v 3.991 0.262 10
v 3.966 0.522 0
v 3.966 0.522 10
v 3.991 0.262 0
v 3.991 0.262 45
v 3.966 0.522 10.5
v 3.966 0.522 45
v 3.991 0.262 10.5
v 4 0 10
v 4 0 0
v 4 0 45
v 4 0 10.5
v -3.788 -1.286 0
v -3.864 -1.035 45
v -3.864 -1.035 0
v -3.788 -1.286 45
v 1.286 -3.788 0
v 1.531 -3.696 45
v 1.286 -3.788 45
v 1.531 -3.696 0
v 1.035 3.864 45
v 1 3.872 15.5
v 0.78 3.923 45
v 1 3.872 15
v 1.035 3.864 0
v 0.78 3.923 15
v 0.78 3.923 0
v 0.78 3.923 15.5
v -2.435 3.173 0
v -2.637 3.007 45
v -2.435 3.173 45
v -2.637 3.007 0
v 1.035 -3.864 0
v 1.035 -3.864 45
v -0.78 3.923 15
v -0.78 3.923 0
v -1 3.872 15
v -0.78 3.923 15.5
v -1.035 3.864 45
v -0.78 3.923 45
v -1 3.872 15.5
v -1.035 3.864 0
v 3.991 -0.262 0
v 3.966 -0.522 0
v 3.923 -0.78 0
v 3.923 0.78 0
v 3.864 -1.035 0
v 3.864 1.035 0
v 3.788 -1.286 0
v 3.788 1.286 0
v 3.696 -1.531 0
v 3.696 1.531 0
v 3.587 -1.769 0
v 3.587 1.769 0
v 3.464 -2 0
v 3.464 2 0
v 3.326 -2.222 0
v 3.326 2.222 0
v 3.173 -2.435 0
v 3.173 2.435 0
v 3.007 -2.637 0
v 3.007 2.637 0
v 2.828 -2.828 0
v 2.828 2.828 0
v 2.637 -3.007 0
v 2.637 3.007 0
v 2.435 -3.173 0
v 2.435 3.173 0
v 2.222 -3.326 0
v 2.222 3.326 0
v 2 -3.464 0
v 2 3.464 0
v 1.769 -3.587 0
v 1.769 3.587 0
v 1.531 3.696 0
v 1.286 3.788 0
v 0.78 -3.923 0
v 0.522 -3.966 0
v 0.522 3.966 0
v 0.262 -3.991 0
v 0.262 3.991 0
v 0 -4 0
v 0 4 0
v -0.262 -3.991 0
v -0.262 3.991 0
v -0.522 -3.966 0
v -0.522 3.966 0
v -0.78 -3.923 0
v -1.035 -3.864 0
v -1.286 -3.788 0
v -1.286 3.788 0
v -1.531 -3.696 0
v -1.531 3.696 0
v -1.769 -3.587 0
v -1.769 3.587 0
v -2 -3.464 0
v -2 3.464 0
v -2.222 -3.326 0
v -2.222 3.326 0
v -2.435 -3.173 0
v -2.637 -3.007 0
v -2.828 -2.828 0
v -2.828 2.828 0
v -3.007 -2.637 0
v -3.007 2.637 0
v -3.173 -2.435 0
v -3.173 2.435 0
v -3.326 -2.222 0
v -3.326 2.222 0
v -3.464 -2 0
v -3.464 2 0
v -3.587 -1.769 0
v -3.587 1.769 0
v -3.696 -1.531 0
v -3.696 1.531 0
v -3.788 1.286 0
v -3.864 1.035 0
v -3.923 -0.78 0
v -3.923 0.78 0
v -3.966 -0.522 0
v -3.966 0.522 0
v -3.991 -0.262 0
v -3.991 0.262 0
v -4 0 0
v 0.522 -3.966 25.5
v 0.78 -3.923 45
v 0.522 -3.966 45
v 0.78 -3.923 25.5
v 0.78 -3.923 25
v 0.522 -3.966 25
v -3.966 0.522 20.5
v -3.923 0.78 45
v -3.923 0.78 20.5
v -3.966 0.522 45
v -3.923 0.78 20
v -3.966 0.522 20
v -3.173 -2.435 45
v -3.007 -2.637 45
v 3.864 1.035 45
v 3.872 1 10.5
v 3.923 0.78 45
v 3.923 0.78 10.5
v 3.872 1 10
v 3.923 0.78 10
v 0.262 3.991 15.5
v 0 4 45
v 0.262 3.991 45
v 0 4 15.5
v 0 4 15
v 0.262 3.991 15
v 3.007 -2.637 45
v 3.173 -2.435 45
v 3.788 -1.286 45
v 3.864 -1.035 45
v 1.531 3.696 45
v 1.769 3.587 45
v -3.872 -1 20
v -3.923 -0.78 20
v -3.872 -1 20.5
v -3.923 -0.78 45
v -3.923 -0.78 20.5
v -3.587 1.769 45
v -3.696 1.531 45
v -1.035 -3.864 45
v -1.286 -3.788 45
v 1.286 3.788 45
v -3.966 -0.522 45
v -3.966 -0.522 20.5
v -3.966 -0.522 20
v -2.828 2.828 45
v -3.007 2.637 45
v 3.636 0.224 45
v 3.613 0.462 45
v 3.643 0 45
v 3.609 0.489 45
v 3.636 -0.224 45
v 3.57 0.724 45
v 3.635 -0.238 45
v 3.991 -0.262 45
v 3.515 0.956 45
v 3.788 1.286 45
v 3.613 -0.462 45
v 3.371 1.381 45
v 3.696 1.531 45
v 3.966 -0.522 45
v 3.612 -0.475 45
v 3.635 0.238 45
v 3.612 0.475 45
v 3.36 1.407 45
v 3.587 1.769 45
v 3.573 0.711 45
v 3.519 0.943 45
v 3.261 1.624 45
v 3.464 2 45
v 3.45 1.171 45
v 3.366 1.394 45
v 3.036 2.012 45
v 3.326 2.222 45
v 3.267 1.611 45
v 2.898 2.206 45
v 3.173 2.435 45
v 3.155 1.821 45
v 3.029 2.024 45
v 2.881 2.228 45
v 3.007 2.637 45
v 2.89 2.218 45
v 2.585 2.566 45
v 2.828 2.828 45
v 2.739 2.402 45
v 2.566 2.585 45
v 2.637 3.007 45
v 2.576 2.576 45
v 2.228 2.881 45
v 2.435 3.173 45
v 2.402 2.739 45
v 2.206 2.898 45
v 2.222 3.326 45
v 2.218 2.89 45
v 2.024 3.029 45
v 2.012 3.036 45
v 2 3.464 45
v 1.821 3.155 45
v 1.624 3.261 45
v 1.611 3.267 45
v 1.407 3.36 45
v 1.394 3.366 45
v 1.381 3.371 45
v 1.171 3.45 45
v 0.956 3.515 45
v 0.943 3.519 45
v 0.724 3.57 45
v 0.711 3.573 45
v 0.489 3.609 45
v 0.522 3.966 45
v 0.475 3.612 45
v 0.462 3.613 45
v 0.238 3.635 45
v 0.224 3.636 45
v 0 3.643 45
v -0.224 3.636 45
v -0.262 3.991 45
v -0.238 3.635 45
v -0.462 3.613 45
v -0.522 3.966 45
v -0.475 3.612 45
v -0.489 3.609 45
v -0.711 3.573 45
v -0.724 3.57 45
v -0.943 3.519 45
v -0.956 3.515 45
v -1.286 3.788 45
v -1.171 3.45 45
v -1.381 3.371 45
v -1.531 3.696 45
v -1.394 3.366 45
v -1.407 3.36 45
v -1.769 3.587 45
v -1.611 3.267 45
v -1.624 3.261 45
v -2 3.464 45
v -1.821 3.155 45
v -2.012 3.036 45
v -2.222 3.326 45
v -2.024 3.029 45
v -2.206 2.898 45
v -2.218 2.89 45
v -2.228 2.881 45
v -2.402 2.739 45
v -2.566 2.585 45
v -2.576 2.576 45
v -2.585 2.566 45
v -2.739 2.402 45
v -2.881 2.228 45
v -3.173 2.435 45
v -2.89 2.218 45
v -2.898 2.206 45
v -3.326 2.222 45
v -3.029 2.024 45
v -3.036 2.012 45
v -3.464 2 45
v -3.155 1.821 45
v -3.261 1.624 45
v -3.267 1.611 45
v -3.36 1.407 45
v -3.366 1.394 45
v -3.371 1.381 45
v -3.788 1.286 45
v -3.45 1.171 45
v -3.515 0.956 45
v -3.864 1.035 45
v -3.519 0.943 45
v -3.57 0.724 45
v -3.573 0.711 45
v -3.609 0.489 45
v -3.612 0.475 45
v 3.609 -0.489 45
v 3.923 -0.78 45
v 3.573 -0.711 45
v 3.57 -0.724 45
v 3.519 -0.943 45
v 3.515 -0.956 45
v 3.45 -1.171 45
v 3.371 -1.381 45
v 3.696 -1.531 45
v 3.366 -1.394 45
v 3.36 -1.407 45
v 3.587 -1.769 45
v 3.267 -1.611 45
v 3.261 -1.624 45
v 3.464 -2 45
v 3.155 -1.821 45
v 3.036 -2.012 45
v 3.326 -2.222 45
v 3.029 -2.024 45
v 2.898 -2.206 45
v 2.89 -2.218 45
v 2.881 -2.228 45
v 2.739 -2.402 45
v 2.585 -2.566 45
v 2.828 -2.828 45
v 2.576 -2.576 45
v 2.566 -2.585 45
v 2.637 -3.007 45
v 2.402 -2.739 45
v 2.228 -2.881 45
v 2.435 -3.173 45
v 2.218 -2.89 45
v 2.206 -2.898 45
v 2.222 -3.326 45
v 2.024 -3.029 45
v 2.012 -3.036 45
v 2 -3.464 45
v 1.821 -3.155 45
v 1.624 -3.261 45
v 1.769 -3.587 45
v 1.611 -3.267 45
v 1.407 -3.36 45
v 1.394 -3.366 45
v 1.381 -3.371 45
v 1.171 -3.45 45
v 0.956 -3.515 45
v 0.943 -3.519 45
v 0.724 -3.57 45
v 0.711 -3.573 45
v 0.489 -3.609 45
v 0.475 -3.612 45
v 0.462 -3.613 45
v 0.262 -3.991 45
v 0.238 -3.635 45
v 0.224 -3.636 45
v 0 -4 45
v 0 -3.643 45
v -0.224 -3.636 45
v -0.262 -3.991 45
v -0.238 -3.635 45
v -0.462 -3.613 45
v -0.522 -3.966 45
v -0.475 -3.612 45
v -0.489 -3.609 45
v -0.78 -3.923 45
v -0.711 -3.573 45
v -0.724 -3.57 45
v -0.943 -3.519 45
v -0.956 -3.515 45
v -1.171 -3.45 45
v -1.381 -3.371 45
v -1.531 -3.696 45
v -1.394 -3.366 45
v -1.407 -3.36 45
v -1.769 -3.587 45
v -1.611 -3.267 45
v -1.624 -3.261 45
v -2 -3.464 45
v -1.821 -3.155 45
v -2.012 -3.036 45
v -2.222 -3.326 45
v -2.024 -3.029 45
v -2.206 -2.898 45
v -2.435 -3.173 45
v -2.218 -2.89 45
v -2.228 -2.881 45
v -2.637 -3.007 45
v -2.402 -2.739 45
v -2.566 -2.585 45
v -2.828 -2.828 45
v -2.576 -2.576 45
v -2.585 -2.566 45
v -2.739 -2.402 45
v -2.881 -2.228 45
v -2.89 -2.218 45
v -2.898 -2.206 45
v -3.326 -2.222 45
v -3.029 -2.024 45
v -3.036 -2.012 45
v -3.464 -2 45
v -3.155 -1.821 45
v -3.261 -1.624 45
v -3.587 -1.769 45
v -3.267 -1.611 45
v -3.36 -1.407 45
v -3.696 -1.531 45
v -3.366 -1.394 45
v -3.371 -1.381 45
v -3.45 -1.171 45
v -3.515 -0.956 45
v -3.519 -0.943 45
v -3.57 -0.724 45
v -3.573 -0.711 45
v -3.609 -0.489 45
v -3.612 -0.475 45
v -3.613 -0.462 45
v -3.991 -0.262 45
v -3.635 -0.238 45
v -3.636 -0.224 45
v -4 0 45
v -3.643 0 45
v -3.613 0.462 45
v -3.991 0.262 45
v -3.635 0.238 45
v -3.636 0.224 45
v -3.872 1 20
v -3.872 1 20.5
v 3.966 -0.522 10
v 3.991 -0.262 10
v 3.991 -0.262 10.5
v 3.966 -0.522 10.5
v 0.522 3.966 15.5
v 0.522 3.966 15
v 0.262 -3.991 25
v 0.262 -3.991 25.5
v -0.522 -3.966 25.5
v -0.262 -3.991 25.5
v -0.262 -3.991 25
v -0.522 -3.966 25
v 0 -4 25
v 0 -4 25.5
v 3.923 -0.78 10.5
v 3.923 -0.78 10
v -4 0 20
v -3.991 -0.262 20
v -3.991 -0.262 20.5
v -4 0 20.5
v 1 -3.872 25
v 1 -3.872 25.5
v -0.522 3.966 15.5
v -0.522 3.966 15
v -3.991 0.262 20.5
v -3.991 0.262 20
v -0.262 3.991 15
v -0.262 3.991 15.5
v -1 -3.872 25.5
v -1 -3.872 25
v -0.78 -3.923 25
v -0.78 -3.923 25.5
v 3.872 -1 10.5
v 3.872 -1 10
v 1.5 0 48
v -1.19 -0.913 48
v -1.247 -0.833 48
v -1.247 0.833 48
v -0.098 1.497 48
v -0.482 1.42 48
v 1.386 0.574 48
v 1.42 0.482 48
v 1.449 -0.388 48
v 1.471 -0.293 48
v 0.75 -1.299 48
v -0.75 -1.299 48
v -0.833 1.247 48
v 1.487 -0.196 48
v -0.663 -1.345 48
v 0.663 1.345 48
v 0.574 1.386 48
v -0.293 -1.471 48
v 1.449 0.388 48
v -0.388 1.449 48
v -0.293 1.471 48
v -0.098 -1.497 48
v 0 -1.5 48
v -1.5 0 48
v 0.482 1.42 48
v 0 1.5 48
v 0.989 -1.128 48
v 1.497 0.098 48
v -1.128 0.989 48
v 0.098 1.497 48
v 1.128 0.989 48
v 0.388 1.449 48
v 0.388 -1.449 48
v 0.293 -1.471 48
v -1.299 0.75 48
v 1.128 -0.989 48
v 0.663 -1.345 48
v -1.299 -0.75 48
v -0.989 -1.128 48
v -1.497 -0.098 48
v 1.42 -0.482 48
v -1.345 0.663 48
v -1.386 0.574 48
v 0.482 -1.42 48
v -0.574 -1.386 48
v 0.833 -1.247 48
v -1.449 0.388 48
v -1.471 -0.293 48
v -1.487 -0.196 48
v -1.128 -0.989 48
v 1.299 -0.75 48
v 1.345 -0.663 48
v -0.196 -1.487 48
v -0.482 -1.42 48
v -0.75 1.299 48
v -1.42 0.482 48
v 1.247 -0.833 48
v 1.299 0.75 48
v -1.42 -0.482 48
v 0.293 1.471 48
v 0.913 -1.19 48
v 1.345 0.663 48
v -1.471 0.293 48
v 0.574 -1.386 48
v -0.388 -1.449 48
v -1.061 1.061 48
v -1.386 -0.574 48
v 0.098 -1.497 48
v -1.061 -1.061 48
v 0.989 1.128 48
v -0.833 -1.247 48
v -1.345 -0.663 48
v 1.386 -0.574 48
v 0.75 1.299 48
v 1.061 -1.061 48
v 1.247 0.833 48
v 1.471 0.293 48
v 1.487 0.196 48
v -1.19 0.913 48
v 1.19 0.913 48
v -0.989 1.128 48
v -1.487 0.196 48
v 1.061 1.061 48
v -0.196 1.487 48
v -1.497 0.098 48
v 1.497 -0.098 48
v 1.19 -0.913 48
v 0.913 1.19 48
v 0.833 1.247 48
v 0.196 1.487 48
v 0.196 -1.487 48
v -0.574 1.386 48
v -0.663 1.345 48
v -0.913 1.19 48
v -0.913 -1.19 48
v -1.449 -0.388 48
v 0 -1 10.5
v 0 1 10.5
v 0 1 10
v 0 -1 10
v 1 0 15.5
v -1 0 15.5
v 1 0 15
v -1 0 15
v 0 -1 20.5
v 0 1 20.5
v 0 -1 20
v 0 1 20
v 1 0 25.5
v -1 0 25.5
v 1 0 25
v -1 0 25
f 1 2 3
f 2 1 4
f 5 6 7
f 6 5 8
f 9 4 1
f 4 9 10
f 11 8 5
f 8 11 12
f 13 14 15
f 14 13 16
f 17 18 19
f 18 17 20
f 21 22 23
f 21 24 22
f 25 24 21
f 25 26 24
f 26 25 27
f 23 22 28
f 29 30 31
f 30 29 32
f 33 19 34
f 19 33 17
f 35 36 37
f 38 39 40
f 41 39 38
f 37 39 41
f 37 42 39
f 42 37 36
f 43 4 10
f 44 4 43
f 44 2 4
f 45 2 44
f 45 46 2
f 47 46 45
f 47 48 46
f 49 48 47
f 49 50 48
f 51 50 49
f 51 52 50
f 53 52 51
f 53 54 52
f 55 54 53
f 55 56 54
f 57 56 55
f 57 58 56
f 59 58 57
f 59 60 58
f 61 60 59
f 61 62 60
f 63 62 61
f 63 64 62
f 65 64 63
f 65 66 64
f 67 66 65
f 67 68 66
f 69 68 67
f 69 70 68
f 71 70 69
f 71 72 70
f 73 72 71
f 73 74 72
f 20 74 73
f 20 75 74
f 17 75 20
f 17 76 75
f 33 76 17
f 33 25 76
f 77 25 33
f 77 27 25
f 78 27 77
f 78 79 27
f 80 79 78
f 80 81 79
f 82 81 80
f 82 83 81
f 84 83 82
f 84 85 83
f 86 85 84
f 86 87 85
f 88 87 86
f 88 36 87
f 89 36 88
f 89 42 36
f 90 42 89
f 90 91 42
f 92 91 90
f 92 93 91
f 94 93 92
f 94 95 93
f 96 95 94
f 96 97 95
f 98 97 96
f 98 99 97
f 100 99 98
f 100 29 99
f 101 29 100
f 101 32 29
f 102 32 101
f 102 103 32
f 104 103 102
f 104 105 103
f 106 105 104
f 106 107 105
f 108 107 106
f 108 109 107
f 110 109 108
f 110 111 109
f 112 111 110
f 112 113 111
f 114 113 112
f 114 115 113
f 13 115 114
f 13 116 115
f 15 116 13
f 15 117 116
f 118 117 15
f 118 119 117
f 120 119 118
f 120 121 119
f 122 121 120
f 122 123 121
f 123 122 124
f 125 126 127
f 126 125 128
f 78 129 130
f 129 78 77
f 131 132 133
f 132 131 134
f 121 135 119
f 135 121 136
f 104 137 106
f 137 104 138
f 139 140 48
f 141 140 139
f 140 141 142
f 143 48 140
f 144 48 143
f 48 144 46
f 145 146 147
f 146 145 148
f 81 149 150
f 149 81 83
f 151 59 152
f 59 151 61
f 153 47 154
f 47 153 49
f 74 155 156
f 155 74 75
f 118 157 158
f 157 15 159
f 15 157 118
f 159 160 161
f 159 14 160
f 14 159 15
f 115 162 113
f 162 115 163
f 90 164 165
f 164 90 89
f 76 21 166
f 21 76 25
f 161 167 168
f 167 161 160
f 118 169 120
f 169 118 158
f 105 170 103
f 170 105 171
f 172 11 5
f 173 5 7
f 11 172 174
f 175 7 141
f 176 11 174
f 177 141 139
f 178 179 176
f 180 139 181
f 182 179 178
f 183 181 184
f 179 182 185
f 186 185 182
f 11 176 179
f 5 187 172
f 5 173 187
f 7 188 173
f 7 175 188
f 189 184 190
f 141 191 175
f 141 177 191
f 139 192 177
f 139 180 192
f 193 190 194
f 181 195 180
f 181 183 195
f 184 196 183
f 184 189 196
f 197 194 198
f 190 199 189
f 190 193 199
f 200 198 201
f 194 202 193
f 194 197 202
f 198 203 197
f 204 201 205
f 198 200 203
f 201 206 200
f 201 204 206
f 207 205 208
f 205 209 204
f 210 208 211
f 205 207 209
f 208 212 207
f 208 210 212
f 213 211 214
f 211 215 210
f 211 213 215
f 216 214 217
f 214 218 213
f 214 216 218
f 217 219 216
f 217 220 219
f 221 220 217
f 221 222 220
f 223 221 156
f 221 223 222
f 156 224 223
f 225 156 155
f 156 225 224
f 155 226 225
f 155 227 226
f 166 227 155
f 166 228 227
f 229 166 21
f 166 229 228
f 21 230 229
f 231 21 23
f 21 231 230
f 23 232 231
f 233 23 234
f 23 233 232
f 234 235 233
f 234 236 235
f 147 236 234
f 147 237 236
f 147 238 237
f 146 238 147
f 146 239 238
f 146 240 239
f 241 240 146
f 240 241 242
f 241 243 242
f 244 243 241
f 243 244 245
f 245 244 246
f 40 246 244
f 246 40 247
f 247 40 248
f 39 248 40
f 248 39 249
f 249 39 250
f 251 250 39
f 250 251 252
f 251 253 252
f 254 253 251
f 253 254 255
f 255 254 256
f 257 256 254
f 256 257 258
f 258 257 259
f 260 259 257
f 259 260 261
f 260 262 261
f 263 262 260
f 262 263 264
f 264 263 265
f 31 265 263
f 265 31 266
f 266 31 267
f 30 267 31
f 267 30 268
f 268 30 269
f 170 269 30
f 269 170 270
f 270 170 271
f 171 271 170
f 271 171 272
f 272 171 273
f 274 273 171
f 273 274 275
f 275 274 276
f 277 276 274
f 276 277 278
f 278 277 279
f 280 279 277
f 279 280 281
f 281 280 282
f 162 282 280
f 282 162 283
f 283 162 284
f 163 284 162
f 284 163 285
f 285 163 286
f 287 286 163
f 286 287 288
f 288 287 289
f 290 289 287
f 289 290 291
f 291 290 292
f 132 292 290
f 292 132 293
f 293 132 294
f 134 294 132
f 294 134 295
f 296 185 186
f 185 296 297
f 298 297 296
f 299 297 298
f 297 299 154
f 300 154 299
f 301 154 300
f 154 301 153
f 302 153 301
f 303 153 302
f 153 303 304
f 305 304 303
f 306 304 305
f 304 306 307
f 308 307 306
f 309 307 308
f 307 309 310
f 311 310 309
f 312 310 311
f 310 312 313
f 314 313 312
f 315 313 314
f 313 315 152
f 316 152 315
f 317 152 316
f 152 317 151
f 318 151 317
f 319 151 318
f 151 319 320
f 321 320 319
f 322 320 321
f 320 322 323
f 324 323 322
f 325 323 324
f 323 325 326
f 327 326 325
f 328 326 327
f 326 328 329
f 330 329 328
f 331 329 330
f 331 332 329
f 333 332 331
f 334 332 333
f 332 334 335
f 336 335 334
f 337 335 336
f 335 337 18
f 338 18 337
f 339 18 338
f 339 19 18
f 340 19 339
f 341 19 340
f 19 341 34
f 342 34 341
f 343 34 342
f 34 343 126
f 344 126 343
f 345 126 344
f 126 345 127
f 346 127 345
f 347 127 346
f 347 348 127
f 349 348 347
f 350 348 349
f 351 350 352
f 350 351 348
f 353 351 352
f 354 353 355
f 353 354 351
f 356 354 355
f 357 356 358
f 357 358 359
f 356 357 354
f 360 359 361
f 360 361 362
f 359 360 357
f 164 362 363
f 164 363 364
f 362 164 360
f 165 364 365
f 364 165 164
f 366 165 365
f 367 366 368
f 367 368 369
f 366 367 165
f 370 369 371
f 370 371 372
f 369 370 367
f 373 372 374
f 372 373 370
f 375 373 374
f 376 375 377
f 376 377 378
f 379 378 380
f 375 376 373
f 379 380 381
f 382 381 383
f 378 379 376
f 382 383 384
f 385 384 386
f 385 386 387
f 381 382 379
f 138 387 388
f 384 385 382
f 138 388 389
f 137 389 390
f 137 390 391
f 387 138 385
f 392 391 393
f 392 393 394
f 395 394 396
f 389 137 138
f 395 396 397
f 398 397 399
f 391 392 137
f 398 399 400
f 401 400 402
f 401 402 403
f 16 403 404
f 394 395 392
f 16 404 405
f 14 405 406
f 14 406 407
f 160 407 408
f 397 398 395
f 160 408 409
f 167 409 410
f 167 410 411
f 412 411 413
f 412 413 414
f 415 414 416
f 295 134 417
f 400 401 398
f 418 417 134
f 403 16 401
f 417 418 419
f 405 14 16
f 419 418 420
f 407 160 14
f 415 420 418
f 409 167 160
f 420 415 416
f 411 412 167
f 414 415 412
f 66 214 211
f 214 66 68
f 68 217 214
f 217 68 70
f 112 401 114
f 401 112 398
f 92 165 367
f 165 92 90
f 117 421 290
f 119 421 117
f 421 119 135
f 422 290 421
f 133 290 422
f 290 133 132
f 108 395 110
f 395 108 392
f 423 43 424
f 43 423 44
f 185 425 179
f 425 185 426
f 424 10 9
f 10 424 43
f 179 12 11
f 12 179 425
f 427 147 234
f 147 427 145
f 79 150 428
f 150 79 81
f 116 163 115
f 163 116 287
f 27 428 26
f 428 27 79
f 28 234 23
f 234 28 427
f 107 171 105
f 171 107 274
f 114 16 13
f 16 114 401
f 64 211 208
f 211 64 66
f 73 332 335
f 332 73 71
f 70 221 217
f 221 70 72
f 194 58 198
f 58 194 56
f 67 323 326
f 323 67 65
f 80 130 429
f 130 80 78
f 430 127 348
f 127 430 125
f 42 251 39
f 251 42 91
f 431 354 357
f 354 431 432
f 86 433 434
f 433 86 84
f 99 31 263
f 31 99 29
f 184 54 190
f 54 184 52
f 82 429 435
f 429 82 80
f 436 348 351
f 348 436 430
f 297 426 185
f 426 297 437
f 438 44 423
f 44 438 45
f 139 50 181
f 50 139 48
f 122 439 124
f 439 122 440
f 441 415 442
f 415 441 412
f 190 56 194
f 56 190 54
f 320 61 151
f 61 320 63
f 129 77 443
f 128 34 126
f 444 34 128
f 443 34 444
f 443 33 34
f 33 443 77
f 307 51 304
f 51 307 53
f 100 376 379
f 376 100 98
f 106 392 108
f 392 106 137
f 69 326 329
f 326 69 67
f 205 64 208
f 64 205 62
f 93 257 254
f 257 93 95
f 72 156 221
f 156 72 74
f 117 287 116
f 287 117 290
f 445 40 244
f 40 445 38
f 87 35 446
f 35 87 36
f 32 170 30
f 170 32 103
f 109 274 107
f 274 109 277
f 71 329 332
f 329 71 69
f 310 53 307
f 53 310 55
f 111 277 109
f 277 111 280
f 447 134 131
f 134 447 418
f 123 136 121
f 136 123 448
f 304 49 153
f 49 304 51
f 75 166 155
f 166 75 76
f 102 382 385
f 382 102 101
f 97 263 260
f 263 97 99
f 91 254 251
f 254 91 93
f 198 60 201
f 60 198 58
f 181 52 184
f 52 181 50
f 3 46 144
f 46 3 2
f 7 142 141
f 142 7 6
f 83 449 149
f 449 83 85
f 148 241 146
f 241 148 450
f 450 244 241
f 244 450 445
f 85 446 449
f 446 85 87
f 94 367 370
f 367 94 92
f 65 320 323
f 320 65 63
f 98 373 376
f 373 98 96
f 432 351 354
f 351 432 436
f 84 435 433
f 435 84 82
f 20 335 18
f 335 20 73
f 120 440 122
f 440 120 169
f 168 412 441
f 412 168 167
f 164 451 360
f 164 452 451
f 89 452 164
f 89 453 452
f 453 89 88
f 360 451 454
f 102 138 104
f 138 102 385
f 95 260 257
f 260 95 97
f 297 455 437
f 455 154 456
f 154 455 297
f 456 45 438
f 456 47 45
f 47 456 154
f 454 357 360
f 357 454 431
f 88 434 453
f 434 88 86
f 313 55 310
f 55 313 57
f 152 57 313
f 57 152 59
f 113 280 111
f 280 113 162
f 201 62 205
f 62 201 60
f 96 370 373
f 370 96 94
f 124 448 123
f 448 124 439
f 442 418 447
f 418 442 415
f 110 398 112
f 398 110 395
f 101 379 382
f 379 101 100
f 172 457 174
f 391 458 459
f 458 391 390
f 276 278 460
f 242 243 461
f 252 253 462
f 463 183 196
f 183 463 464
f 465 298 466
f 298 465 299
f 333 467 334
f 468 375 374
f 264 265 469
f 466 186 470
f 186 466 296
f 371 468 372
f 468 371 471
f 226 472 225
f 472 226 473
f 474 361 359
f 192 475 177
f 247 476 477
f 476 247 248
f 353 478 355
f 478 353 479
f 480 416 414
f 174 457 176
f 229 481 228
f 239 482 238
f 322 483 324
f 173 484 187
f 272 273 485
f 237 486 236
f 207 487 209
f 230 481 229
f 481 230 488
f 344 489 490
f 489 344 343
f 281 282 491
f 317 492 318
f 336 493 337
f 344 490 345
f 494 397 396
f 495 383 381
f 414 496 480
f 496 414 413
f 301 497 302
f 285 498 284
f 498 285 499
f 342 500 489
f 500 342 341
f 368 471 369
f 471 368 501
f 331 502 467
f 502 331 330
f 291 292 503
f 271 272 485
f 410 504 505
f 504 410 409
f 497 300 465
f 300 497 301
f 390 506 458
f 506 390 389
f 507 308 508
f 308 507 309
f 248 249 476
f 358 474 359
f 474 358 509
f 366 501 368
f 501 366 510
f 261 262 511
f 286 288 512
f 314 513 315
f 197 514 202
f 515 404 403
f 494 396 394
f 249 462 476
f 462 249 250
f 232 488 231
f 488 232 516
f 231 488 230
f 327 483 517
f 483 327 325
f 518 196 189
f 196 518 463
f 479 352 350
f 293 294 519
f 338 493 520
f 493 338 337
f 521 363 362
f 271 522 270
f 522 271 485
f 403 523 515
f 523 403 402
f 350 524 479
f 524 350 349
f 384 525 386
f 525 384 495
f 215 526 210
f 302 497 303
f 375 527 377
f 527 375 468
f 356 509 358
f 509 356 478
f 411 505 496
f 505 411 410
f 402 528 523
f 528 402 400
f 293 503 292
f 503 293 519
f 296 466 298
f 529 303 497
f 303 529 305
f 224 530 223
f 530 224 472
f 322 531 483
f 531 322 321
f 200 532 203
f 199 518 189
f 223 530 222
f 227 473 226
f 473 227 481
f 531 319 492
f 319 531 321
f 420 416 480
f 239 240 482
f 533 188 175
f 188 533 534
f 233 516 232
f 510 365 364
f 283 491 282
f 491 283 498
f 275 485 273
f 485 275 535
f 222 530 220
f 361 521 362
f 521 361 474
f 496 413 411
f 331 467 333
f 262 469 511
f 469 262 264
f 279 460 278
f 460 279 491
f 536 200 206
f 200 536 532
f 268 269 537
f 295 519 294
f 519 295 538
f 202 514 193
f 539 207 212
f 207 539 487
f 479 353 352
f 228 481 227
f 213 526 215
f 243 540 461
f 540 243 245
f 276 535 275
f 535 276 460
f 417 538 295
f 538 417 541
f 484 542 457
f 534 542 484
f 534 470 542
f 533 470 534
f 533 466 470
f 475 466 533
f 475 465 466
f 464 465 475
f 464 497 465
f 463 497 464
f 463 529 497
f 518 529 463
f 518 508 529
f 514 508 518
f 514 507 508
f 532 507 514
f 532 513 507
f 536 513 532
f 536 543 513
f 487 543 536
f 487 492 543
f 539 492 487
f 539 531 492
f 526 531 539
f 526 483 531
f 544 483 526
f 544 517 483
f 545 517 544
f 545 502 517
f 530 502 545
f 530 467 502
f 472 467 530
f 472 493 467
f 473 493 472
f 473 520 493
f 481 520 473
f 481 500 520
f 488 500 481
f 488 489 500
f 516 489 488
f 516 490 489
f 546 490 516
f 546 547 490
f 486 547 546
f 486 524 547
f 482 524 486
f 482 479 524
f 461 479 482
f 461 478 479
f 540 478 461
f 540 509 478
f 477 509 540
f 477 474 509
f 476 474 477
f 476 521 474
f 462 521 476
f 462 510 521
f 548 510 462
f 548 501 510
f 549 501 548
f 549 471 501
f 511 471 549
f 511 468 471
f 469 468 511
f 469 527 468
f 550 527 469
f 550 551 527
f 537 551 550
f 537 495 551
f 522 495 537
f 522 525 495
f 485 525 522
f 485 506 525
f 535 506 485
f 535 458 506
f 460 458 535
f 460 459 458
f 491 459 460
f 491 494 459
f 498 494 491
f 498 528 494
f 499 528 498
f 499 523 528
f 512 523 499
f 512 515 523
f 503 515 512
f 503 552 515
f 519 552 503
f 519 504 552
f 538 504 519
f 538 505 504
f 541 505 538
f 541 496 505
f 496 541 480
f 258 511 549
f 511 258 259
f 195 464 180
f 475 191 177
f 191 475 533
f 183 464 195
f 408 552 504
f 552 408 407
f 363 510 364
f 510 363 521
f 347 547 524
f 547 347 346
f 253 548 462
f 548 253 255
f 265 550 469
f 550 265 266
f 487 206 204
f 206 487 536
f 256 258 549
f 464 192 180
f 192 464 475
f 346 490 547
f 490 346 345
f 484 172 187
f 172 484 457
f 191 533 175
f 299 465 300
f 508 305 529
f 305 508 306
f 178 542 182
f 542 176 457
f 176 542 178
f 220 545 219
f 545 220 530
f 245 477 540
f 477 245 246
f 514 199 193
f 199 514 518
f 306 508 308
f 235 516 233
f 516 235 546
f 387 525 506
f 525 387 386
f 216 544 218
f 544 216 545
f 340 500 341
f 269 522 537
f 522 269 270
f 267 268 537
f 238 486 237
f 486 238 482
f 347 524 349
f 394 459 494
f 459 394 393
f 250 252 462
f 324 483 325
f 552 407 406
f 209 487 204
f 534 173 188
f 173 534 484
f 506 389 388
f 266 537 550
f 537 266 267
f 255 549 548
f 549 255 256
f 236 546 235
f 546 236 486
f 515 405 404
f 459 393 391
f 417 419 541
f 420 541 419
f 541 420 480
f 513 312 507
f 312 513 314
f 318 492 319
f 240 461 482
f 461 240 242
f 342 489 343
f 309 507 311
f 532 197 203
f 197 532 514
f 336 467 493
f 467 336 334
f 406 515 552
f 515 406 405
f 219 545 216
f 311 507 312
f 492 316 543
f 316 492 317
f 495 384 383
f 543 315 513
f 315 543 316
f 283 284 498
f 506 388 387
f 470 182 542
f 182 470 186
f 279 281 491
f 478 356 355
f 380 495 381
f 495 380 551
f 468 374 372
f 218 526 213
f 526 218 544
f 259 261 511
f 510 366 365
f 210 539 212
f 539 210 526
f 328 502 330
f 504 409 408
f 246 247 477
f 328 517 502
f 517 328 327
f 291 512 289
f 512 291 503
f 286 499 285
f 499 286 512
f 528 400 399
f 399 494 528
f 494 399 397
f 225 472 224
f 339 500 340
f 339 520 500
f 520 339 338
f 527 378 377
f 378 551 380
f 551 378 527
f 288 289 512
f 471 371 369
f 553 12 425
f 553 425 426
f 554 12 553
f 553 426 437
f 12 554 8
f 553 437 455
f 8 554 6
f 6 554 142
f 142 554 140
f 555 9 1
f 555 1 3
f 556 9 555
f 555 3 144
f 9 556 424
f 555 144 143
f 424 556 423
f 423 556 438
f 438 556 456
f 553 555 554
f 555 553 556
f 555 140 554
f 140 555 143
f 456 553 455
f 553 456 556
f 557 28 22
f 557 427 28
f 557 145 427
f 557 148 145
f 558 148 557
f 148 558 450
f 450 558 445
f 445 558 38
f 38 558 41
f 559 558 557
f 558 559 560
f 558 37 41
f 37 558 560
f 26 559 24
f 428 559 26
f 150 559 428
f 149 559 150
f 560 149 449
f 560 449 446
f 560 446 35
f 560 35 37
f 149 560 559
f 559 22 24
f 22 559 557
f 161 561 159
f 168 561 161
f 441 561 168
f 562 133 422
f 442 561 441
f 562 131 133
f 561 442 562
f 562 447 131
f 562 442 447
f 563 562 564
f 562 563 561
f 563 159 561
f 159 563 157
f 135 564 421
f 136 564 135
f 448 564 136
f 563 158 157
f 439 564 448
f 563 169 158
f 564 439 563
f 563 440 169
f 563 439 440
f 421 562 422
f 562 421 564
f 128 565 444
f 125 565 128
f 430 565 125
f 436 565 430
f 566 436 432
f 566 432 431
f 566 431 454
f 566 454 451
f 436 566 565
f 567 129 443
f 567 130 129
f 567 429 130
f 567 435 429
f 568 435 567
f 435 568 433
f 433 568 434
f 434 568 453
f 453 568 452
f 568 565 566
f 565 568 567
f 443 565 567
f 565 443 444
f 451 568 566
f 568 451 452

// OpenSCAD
// Pestle for grinding tissue inside a 1.5 mL microcentrifuge tube
// Print orientation: standing upright on the bed (z = 0)

$fn = 96;

// ---- Dimensions (mm) ----
handle_d      = 8;    // handle diameter
handle_h      = 45;   // handle height (z = 0 to 45)
cone_d_bottom = 8;    // cone diameter at bottom (z = 45)
cone_d_top    = 3;    // cone diameter at top (z = 62)
tip_r         = 1.5;  // tip sphere radius (centred at z = 62)
groove_w      = 2;    // groove width in Z
groove_d      = 1;    // groove depth
groove_z      = [10, 15, 20, 25]; // groove centre heights

eps = 0.5;            // overshoot for clean cuts

// ---- Model ----
difference() {
    union() {
        // Handle
        cylinder(d = handle_d, h = handle_h);
        // Cone (slight overlap into handle for a clean union)
        translate([0, 0, handle_h - eps])
            cylinder(d1 = cone_d_bottom, d2 = cone_d_top, h = cone_d_top + eps);
        // Tip sphere
        translate([0, 0, tip_r])
            sphere(r = tip_r);
    }
    // Grooves
    for (i = [0 : 3]) {
        rotate([0, 0, i * 90])
            translate([0, -groove_d, groove_z[i]])
                cube([handle_d + 2 * eps, groove_w, eps]);
    }
}
